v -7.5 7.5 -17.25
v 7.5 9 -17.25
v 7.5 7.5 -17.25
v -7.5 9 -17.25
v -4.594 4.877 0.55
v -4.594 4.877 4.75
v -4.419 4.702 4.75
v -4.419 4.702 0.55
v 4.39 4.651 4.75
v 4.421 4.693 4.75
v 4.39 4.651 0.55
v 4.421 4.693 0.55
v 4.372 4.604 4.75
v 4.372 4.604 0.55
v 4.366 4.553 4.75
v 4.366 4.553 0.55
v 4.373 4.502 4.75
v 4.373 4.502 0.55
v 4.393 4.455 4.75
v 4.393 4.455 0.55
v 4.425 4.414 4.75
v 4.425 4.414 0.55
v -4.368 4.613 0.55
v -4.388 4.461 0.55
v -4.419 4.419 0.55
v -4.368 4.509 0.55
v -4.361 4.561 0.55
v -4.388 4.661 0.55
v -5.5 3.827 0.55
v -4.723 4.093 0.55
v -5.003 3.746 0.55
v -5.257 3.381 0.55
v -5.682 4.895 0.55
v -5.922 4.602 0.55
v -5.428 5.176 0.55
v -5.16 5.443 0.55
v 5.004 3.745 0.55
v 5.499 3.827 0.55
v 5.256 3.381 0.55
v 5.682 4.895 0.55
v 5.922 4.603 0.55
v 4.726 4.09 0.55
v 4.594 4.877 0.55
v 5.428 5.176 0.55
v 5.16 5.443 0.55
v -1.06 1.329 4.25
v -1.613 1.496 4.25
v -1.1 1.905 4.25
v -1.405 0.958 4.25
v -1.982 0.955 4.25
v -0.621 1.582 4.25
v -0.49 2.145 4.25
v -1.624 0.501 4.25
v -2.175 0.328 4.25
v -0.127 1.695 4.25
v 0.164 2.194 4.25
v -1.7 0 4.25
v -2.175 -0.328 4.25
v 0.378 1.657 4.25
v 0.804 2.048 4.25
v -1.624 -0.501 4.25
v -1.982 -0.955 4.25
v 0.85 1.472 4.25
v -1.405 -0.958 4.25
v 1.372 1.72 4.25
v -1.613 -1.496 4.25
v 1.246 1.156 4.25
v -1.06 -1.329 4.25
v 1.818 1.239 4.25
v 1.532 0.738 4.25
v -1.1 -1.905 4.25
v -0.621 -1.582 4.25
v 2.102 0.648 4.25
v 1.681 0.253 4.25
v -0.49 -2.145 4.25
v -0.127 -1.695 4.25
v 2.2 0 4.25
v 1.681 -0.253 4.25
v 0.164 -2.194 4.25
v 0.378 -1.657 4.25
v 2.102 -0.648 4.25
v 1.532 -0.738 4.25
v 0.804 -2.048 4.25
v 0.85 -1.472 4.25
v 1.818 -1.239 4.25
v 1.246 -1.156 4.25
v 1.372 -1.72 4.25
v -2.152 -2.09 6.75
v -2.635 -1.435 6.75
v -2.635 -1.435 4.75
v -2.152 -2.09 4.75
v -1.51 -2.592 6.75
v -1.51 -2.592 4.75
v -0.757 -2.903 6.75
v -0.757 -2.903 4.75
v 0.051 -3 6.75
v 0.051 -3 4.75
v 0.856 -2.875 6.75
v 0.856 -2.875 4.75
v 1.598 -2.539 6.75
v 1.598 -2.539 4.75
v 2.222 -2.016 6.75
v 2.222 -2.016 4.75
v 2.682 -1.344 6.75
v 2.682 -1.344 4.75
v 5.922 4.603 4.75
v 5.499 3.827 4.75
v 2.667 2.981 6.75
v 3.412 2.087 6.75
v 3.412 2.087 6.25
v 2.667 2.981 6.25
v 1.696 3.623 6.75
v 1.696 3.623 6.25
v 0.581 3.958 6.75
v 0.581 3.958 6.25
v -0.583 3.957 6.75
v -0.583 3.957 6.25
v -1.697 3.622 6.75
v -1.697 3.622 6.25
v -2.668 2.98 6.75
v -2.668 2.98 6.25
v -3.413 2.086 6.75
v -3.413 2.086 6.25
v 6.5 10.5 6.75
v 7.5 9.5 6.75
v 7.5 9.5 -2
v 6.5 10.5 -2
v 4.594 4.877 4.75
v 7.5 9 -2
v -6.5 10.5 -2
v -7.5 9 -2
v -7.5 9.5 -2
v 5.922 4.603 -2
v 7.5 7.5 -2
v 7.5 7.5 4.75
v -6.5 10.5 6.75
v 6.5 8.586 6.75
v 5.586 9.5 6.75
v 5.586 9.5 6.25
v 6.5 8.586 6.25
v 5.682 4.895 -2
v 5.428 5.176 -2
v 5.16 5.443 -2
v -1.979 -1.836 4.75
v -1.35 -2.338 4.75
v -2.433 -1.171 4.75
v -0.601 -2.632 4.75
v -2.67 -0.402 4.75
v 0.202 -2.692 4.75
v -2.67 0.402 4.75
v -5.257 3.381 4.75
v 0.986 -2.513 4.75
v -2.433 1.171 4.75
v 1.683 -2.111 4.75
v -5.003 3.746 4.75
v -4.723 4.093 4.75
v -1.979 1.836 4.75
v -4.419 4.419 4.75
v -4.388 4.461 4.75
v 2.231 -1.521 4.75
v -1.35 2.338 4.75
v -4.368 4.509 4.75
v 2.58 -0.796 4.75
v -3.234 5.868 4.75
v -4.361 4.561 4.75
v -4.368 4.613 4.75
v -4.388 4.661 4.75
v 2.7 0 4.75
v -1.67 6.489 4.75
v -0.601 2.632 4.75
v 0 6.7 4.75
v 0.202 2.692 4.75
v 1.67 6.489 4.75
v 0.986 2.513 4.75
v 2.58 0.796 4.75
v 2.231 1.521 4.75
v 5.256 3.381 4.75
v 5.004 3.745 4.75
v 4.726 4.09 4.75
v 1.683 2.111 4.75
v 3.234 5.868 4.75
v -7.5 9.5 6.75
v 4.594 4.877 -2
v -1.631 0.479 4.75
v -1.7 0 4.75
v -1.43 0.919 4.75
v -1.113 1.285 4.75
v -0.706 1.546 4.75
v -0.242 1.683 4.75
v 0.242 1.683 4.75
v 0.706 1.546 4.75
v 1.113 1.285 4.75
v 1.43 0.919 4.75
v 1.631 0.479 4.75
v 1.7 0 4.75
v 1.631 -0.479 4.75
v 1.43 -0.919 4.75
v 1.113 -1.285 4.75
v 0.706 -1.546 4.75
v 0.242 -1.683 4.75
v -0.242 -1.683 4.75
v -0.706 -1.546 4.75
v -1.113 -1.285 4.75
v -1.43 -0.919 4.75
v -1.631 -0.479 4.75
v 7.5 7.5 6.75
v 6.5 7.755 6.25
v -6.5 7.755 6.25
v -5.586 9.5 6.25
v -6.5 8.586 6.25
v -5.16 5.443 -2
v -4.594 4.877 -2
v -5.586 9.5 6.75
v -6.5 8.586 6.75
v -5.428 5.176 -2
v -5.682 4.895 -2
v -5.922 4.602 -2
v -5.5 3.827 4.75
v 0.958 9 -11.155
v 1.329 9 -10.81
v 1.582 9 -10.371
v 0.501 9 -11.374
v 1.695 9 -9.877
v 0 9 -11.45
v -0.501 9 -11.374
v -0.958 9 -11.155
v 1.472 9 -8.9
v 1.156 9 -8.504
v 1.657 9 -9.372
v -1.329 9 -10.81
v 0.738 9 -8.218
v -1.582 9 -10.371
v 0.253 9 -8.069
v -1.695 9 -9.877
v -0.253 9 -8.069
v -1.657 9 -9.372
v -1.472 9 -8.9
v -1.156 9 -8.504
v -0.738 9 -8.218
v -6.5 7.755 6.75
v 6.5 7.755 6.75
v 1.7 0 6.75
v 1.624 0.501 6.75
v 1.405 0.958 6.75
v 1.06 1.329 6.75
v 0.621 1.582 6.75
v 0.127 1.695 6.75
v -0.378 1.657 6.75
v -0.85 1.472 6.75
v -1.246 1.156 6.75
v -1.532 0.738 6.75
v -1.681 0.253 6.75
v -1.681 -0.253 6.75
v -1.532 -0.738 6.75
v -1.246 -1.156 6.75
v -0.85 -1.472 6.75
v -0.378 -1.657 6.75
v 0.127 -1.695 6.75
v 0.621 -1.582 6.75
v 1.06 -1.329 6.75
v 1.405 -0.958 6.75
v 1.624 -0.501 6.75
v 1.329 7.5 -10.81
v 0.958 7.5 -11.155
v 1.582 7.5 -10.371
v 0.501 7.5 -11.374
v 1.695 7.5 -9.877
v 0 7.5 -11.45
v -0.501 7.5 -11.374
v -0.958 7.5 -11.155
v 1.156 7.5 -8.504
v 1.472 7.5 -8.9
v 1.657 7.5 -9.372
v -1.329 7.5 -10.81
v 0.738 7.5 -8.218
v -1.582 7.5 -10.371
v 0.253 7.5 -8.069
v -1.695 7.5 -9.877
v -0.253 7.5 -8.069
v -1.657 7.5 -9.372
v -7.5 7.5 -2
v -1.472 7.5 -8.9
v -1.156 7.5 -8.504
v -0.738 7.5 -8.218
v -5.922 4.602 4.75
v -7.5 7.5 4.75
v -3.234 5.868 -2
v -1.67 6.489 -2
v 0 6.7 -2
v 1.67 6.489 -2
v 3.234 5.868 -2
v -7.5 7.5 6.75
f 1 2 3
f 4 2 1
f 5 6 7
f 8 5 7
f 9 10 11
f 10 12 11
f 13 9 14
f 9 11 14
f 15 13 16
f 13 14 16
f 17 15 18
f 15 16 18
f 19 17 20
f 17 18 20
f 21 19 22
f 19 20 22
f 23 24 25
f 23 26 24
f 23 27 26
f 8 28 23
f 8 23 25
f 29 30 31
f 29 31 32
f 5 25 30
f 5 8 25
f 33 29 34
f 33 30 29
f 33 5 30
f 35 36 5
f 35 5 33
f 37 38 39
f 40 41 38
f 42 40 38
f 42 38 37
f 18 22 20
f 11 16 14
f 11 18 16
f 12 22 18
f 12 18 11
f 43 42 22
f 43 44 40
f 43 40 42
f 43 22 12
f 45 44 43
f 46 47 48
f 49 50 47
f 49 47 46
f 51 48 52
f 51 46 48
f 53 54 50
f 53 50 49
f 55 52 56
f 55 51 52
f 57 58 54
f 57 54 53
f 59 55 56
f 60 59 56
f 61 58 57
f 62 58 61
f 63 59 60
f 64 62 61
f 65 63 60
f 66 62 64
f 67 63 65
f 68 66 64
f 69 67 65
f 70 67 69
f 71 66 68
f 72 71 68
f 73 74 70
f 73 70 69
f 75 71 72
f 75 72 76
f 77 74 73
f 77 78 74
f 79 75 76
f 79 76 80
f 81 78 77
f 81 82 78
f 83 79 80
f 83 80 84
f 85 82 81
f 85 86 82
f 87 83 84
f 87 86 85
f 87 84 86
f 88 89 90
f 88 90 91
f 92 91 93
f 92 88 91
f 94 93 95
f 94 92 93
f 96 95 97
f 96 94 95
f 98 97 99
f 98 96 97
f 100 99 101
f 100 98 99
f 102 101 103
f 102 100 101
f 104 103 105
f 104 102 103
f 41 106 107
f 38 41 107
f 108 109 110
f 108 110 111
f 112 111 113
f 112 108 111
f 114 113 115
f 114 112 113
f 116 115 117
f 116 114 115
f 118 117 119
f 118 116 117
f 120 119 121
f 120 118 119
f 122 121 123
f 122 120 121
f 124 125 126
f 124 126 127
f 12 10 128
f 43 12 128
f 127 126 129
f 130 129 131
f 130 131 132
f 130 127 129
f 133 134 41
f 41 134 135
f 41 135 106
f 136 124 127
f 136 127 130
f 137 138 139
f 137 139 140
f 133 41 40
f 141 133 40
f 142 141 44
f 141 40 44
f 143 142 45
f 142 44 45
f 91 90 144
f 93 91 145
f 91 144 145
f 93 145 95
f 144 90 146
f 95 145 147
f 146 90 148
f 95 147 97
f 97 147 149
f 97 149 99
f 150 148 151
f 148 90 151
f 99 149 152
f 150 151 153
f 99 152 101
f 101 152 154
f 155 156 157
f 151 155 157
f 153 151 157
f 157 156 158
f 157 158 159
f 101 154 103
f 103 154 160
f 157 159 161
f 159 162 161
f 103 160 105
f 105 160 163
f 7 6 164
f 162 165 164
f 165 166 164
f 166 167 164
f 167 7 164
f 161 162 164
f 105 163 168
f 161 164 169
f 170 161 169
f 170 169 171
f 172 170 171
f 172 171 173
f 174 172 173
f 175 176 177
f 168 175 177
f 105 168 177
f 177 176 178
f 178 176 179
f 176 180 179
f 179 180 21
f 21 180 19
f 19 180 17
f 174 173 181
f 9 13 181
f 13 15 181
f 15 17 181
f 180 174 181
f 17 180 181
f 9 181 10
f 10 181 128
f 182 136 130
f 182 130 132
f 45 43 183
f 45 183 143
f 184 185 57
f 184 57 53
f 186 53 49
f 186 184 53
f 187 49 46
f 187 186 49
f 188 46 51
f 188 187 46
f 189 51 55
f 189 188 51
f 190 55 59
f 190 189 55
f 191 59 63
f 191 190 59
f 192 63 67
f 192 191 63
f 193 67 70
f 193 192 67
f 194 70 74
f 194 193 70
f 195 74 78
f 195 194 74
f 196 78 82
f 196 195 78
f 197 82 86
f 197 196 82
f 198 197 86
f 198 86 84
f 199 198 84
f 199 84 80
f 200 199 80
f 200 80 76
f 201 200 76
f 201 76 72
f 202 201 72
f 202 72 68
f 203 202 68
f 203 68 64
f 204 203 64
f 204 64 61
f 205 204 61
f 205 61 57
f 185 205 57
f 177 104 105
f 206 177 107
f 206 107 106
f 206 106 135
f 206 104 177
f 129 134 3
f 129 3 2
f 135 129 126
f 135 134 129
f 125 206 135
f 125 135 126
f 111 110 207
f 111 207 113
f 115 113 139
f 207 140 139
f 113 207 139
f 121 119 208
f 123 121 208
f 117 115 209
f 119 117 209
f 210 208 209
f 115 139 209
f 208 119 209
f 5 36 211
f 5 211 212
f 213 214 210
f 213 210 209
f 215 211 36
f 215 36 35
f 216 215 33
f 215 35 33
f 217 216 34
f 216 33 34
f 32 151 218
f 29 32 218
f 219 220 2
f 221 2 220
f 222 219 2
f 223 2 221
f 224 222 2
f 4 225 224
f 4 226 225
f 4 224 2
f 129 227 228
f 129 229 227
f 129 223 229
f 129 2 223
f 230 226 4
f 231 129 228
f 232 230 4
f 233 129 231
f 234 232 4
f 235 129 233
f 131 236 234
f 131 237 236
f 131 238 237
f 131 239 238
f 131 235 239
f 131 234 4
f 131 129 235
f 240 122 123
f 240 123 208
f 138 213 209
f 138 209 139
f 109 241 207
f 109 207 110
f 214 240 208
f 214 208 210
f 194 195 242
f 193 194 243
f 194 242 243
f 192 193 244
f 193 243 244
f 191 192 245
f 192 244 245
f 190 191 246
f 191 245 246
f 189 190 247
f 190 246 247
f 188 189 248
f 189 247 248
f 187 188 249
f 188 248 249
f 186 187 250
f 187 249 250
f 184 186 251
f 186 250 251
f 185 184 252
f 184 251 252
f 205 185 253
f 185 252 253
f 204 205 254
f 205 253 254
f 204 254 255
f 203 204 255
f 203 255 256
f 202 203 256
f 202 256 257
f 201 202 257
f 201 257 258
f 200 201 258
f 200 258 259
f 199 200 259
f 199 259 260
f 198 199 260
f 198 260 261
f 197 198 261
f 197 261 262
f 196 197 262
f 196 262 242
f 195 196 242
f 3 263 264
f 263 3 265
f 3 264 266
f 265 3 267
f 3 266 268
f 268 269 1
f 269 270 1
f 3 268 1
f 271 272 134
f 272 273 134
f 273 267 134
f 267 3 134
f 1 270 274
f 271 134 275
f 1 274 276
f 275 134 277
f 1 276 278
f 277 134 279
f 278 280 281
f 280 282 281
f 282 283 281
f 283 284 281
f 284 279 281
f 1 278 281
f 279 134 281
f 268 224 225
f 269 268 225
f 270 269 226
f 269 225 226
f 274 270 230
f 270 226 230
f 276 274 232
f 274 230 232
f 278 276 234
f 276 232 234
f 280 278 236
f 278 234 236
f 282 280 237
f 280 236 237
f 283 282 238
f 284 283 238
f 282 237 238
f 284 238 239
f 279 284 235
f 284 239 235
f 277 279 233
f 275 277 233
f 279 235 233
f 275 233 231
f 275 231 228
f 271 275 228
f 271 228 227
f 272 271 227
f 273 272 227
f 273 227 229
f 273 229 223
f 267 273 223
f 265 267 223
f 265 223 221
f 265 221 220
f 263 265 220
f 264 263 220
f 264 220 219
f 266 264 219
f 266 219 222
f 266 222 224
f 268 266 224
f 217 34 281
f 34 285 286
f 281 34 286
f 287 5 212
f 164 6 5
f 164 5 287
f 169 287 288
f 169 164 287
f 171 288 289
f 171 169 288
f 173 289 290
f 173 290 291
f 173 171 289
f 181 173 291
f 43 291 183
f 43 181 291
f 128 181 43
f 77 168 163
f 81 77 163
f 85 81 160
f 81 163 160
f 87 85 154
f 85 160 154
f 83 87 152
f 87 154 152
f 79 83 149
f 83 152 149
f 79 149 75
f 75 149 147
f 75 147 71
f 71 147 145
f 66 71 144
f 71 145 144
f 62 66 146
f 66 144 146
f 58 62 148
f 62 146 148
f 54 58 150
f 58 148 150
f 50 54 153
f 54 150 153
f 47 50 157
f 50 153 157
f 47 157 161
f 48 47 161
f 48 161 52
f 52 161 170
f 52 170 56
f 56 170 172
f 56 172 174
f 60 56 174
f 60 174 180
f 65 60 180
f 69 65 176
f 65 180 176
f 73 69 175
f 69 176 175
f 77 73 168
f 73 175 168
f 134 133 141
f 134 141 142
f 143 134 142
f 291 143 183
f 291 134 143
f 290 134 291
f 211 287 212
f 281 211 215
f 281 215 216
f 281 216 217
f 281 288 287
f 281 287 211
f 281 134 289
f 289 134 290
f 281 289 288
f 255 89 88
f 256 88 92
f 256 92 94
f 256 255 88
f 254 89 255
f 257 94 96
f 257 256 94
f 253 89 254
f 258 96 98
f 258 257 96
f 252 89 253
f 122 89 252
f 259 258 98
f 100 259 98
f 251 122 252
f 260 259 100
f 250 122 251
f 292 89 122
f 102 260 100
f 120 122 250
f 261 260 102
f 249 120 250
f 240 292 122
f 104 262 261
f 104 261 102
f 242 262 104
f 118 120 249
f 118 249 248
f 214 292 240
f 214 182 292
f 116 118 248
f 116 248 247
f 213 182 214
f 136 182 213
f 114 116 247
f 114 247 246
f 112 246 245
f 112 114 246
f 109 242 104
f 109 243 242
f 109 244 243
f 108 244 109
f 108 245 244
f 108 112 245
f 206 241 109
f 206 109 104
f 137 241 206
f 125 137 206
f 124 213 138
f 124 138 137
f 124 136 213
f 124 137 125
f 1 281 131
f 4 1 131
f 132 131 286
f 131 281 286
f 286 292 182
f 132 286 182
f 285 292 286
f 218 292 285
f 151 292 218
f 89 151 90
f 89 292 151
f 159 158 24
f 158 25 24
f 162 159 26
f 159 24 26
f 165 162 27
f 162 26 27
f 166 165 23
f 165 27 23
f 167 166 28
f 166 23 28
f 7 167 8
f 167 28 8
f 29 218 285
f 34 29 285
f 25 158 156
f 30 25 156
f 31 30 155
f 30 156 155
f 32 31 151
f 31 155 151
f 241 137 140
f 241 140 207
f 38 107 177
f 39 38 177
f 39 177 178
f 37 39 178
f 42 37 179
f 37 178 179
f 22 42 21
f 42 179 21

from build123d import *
from build123d.topology import SkipClean

# Parameters (mm, degrees)
BOSS_EXTRUDE1_DEPTH    = 2
BOSS_EXTRUDE2_START    = 4.75
BOSS_EXTRUDE2_DEPTH    = 4.75
BOSS_EXTRUDE3_START    = 2
SKETCH3_R              = 3
SKETCH3_R_2            = 1.7
BOSS_EXTRUDE3_DEPTH    = 2
SKETCH4_R              = 2.2
SKETCH4_R_2            = 1.7
BOSS_EXTRUDE4_DEPTH    = 0.5
CHAMFER1_SIZE          = 0.5
SKETCH5_W              = 7.5
SKETCH5_H              = 3
BOSS_EXTRUDE5_DEPTH    = 2
BOSS_EXTRUDE6_DEPTH    = 4.2
BOSS_EXTRUDE8_DEPTH    = 6.75
SKETCH10_W             = 15
SKETCH10_H             = 3
BOSS_EXTRUDE9_DEPTH    = 15.25
SKETCH11_R             = 1.65
CUT_EXTRUDE1_DEPTH     = 22.542109925
FILLET1_R              = 0.2
BOSS_EXTRUDE12_REACH   = 29.249
SKETCH16_W             = 15
SKETCH16_H             = 1.5
CUT_EXTRUDE3_DEPTH     = 0.5
CUT_EXTRUDE4_START     = -15.25
CUT_EXTRUDE4_OUTLINE_W = 15
CUT_EXTRUDE4_OUTLINE_H = 1.5
CUT_EXTRUDE4_DEPTH     = 15.25
CUT_EXTRUDE4_START_2   = -24
CUT_EXTRUDE4_2_DEPTH   = 8.75
SKETCH18_R             = 1.7
CUT_EXTRUDE5_DEPTH     = 10


# Read off the part's stored shape, not the designer's step: Cut-Extrude4
with BuildPart() as part:
    # Sketch1 → Boss-Extrude1 (new body)
    with BuildSketch(Plane.XY):
        with BuildLine():
            Line((4.594082841, 4.876925553), (5.159993549, 5.442836262))
            ThreePointArc((5.159993549, 5.442836262), (0, 7.5), (-5.159993549, 5.442836262))
            Line((-5.159993549, 5.442836262), (-4.594082841, 4.876925553))
            ThreePointArc((-4.594082841, 4.876925553), (0, 6.7), (4.594082841, 4.876925553))
        make_face()
    extrude(amount=-BOSS_EXTRUDE1_DEPTH)

    # Sketch1<3> → Boss-Extrude2 (add)
    with BuildSketch(Plane.XY.offset(BOSS_EXTRUDE2_START)):
        with BuildLine():
            Line((4.594082841, 4.876925553), (5.159993549, 5.442836262))
            ThreePointArc((5.159993549, 5.442836262), (0, 7.5), (-5.159993549, 5.442836262))
            Line((-5.159993549, 5.442836262), (-4.594082841, 4.876925553))
            ThreePointArc((-4.594082841, 4.876925553), (0, 6.7), (4.594082841, 4.876925553))
        make_face()
    extrude(amount=-BOSS_EXTRUDE2_DEPTH)

    # Sketch3 → Boss-Extrude3 (add)
    # profile 1 of 4: a face of its own
    with BuildSketch(Plane.XY.offset(4.75).offset(BOSS_EXTRUDE3_START)):
        with BuildLine():
            Line((-4.594082841, 4.876925553), (-5.159993549, 5.442836262))
            Line((-5.159993549, 5.442836262), (-2.820975701, -1.02083108))
            ThreePointArc((-2.820975701, -1.02083108), (-2.892694114, 0.795185994), (-1.902774006, 2.31936437))
            Line((-1.902774006, 2.31936437), (-2.780654635, 4.745309242))
            ThreePointArc((-2.780654635, 4.745309242), (0, 5.5), (2.780654635, 4.745309242))
            Line((2.780654635, 4.745309242), (1.902774006, 2.31936437))
            ThreePointArc((1.902774006, 2.31936437), (2.711855639, 1.282902565), (3, 0))
            ThreePointArc((3, 0), (2.954904999, -0.518205025), (2.820975701, -1.02083108))
            Line((2.820975701, -1.02083108), (5.159993549, 5.442836262))
            Line((5.159993549, 5.442836262), (4.594082841, 4.876925553))
            ThreePointArc((4.594082841, 4.876925553), (0, 6.7), (-4.594082841, 4.876925553))
        make_face()
    # profile 2 of 4: a face of its own
    with BuildSketch(Plane.XY.offset(4.75).offset(BOSS_EXTRUDE3_START)):
        with BuildLine():
            Line((-5.159993549, 5.442836262), (-4.594082841, 4.876925553))
            ThreePointArc((-4.594082841, 4.876925553), (0, 6.7), (4.594082841, 4.876925553))
            Line((4.594082841, 4.876925553), (5.159993549, 5.442836262))
            ThreePointArc((5.159993549, 5.442836262), (0, 7.5), (-5.159993549, 5.442836262))
        make_face()
    # profile 3 of 4: a face of its own
    with BuildSketch(Plane.XY.offset(4.75).offset(BOSS_EXTRUDE3_START)):
        Circle(SKETCH3_R)
        Circle(SKETCH3_R_2, mode=Mode.SUBTRACT)
    # profile 4 of 4: a face of its own
    with BuildSketch(Plane.XY.offset(4.75).offset(BOSS_EXTRUDE3_START)):
        with BuildLine():
            Line((-2.780654635, 4.745309242), (-1.902774006, 2.31936437))
            ThreePointArc((-1.902774006, 2.31936437), (0, 3), (1.902774006, 2.31936437))
            Line((1.902774006, 2.31936437), (2.780654635, 4.745309242))
            ThreePointArc((2.780654635, 4.745309242), (0, 5.5), (-2.780654635, 4.745309242))
        make_face()
    extrude(amount=-BOSS_EXTRUDE3_DEPTH)

    # Sketch4 → Boss-Extrude4 (add)
    with SkipClean():  # the faces are left unmerged after this step: merging them gives an invalid solid
        with BuildSketch(Plane(origin=(0, 0, 4.75), x_dir=(-1, 0, 0), z_dir=(0, 0, -1))):
            with Locations(Location((0, 0, 0), (0, 0, 180))):
                Circle(SKETCH4_R)
            Circle(SKETCH4_R_2, mode=Mode.SUBTRACT)
        extrude(amount=BOSS_EXTRUDE4_DEPTH)
    add(part.part.scale(1), mode=Mode.REPLACE)  # the faces are merged on a copy

    # Chamfer1
    chamfer1_edges = [part.edges().sort_by_distance(p)[0] for p in [
        (-2.2, 0, 4.75),
    ]]
    chamfer(chamfer1_edges, length=CHAMFER1_SIZE - 0.0001)  # a hair under: the kernel refuses the full size

    # Sketch5 → Boss-Extrude5 (add)
    with BuildSketch(Plane.XY.offset(6.75)):
        with BuildLine():
            ThreePointArc((-5.159993549, 5.442836262), (-2.777474396, 6.966752183), (0, 7.5))
            Line((0, 7.5), (-7.5, 7.5))
            Line((-7.5, 7.5), (-2.634698995, -1.434698995))
            ThreePointArc((-2.634698995, -1.434698995), (-2.735675101, -1.231292711), (-2.820975701, -1.02083108))
            Line((-2.820975701, -1.02083108), (-5.159993549, 5.442836262))
        make_face()
        with Locations((-3.75, 9)):
            Rectangle(SKETCH5_W, SKETCH5_H)
        with Locations((3.75, 9)):
            Rectangle(SKETCH5_W, SKETCH5_H)
        with BuildLine():
            Line((7.5, 7.5), (0, 7.5))
            ThreePointArc((0, 7.5), (2.777474396, 6.966752183), (5.159993549, 5.442836262))
            Line((5.159993549, 5.442836262), (2.820975701, -1.02083108))
            ThreePointArc((2.820975701, -1.02083108), (2.756369418, -1.184241374), (2.682306676, -1.343588812))
            Line((2.682306676, -1.343588812), (7.5, 7.5))
        make_face()
    extrude(amount=-BOSS_EXTRUDE5_DEPTH)

    # Sketch6 → Boss-Extrude6 (add)
    with SkipClean():  # the faces are left unmerged after this step: merging them gives an invalid solid
        with BuildSketch(Plane(origin=(0, 0, 4.75), x_dir=(-1, 0, 0), z_dir=(0, 0, -1))):
            with BuildLine():
                Line((-5.921621025, 4.602651891), (-5.499242594, 3.827313795))
                ThreePointArc((-5.499242594, 3.827313795), (-5.073876801, 4.375588441), (-4.594082841, 4.876925553))
                Line((-4.594082841, 4.876925553), (-5.159993549, 5.442836262))
                ThreePointArc((-5.159993549, 5.442836262), (-5.556709713, 5.037159632), (-5.921621025, 4.602651891))
            make_face()
            with BuildLine():
                Line((5.159993549, 5.442836262), (4.594082841, 4.876925553))
                ThreePointArc((4.594082841, 4.876925553), (5.074143899, 4.375278699), (5.499709828, 3.826642367))
                Line((5.499709828, 3.826642367), (5.922007367, 4.602154794))
                ThreePointArc((5.922007367, 4.602154794), (5.556921127, 5.036926403), (5.159993549, 5.442836262))
            make_face()
            with BuildLine():
                Line((-5.499242594, 3.827313795), (-5.256310338, 3.381375701))
                ThreePointArc((-5.256310338, 3.381375701), (-4.806527723, 3.994970744), (-4.285525038, 4.549370852))
                Line((-4.285525038, 4.549370852), (-4.594082841, 4.876925553))
                ThreePointArc((-4.594082841, 4.876925553), (-5.073876801, 4.375588441), (-5.499242594, 3.827313795))
            make_face()
            with BuildLine():
                Line((4.594082841, 4.876925553), (4.275732705, 4.558575417))
                ThreePointArc((4.275732705, 4.558575417), (4.802528974, 3.999776925), (5.256816116, 3.380589346))
                Line((5.256816116, 3.380589346), (5.499709828, 3.826642367))
                ThreePointArc((5.499709828, 3.826642367), (5.074143899, 4.375278699), (4.594082841, 4.876925553))
            make_face()
        extrude(amount=BOSS_EXTRUDE6_DEPTH)

    # Sketch8 → Boss-Extrude8 (add)
    with BuildSketch(Plane(origin=(0, 0, 4.75), x_dir=(-1, 0, 0), z_dir=(0, 0, -1))):
        with BuildLine():
            Line((5.922007367, 4.602154794), (7.5, 7.5))
            Line((7.5, 7.5), (7.5, 10.5))
            Line((7.5, 10.5), (-7.5, 10.5))
            Line((-7.5, 10.5), (-7.5, 7.5))
            Line((-7.5, 7.5), (-5.921621025, 4.602651891))
            ThreePointArc((-5.921621025, 4.602651891), (0.000314788, 7.499999993), (5.922007367, 4.602154794))
        make_face()
    extrude(amount=BOSS_EXTRUDE8_DEPTH)

    # Sketch10 → Boss-Extrude9 (add)
    with BuildSketch(Plane(origin=(0, 0, -2), x_dir=(-1, 0, 0), z_dir=(0, 0, -1))):
        with Locations((0, 9)):
            Rectangle(SKETCH10_W, SKETCH10_H)
    extrude(amount=BOSS_EXTRUDE9_DEPTH)

    # Sketch11 → Cut-Extrude1 (cut, through all)
    with BuildSketch(Plane.XZ.offset(-7.5)):
        with Locations(Location((0, -9.75, 0), (0, 0, 270))):
            Circle(SKETCH11_R)
    extrude(amount=-CUT_EXTRUDE1_DEPTH, mode=Mode.SUBTRACT)

    # Fillet1
    fillet1_edges = [part.edges().sort_by_distance(p)[0] for p in [
        (4.285525038, 4.549370852, 2.65),
        (-4.275732705, 4.558575417, 2.65),
    ]]
    fillet(fillet1_edges, radius=FILLET1_R)

    # Boss-Extrude12: up to this face of the body (flat: up to its plane)
    boss_extrude12_end = Plane(part.part.faces().sort_by_distance((-0.000288638, 5.532557353, 6.75))[0])
    # Sketch16 → Boss-Extrude12 (add, up to the picked face)
    with BuildSketch(Plane(origin=(0, 0, -17.25), x_dir=(-1, 0, 0), z_dir=(0, 0, -1)), mode=Mode.PRIVATE) as boss_extrude12_sk1:
        with Locations((0, 9.75)):
            Rectangle(SKETCH16_W, SKETCH16_H)
    boss_extrude12_tool1 = split(extrude(boss_extrude12_sk1.sketch, amount=-BOSS_EXTRUDE12_REACH, mode=Mode.PRIVATE), bisect_by=boss_extrude12_end, keep=Keep.BOTH, mode=Mode.PRIVATE)
    add(boss_extrude12_tool1.solids().sort_by(Axis((0, 9.75, -17.25), (0, 0, 1)))[0])

    # Sketch13 → Cut-Extrude3 (cut)
    with BuildSketch(Plane.XY.offset(6.75)):
        with BuildLine():
            ThreePointArc((3.4124071, 2.086978147), (-0.000677338, 3.999999943), (-3.413113698, 2.085822351))
            Line((-3.413113698, 2.085822351), (-6.5, 7.754618569))
            Line((-6.5, 7.754618569), (-6.5, 8.585786438))
            Line((-6.5, 8.585786438), (-5.585786438, 9.5))
            Line((-5.585786438, 9.5), (5.585786438, 9.5))
            Line((5.585786438, 9.5), (6.5, 8.585786438))
            Line((6.5, 8.585786438), (6.5, 7.754711685))
            Line((6.5, 7.754711685), (3.4124071, 2.086978147))
        make_face()
    extrude(amount=-CUT_EXTRUDE3_DEPTH, mode=Mode.SUBTRACT)

    # Cut-Extrude4 outline → Cut-Extrude4 (cut)
    with BuildSketch(Plane(origin=(0, 0, -17.25), x_dir=(-1, 0, 0), z_dir=(0, 0, -1)).offset(CUT_EXTRUDE4_START)):
        with Locations((0, 9.75)):
            Rectangle(CUT_EXTRUDE4_OUTLINE_W, CUT_EXTRUDE4_OUTLINE_H)
    extrude(amount=CUT_EXTRUDE4_DEPTH, mode=Mode.SUBTRACT)

    # Cut-Extrude4 2 outline → Cut-Extrude4 2 (cut)
    with BuildSketch(Plane(origin=(0, 0, -17.25), x_dir=(-1, 0, 0), z_dir=(0, 0, -1)).offset(CUT_EXTRUDE4_START_2)):
        Polygon((-7.5, 10.5), (-7.5, 9.5), (-6.5, 10.5), align=None)
        Polygon((7.5, 10.5), (6.5, 10.5), (7.5, 9.5), align=None)
    extrude(amount=CUT_EXTRUDE4_2_DEPTH, mode=Mode.SUBTRACT)

    # Sketch18 → Cut-Extrude5 (cut)
    with BuildSketch(Plane(origin=(0, 10.5, 0), x_dir=(1, 0, 0), z_dir=(0, 1, 0))):
        with Locations(Location((0, 9.75, 0), (0, 0, 90))):
            Circle(SKETCH18_R)
    extrude(amount=-CUT_EXTRUDE5_DEPTH, mode=Mode.SUBTRACT)


solid = part.part
